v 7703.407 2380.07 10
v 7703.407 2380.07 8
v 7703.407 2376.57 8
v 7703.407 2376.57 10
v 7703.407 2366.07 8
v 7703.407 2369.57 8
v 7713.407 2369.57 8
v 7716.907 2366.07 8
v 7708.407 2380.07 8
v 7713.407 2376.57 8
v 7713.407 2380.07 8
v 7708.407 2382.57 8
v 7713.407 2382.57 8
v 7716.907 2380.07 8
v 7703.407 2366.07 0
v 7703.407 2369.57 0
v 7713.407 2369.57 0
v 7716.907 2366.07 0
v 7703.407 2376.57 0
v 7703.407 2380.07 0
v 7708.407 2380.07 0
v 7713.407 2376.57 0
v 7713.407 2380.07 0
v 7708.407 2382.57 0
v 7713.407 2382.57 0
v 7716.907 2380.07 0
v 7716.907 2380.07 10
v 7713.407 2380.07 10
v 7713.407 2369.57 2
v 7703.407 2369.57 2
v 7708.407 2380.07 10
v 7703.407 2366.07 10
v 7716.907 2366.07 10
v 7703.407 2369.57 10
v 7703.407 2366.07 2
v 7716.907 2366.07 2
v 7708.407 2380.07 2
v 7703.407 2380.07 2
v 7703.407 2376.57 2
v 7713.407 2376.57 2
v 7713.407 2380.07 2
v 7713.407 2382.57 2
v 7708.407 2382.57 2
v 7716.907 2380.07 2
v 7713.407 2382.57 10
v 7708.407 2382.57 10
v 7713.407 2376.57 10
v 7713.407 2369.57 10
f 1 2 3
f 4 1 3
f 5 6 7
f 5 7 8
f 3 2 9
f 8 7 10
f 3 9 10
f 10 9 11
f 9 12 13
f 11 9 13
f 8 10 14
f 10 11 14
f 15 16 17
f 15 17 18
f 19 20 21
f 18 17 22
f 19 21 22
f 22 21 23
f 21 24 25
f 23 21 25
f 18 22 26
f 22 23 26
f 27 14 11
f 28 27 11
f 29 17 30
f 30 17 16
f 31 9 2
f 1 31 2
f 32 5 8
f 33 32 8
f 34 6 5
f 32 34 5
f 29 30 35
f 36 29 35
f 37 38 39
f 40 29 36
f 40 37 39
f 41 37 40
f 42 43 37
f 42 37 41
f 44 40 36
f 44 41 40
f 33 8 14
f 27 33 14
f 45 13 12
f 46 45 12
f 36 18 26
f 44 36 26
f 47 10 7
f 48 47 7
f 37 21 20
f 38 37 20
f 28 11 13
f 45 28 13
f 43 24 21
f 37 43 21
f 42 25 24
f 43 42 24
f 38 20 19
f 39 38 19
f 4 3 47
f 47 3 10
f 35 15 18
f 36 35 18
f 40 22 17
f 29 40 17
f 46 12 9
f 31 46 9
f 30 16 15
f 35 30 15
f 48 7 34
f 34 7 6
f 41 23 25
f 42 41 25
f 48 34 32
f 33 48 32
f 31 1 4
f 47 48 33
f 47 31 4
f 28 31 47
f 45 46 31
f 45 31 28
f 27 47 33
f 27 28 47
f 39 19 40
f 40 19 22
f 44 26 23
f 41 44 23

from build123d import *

# Parameters (mm, degrees)
EXTRUDE_1_DEPTH        = 2
PATTERN_LINEAR_1_COUNT = 2
PATTERN_LINEAR_1_PITCH = 8


with BuildPart() as part:
    # 草图8 → 凸台-拉伸1 (new body)
    with BuildSketch(Plane.XY):
        Polygon((7713.406970683, 2376.570087092), (7713.406970683, 2369.570087092), (7703.406970683, 2369.570087092), (7703.406970683, 2367.570087092), (7703.406970683, 2366.070087092), (7716.906970683, 2366.070087092), (7716.906970683, 2367.570087092), (7716.906970683, 2378.570087092), (7716.906970683, 2380.070087092), (7713.406970683, 2380.070087092), (7713.406970683, 2382.570087092), (7708.406970683, 2382.570087092), (7708.406970683, 2380.070087092), (7703.406970683, 2380.070087092), (7703.406970683, 2378.570087092), (7703.406970683, 2376.570087092), align=None)
    extrude(amount=EXTRUDE_1_DEPTH)


with BuildPart() as pattern_linear_1_1:
    # 阵列(线性)1: pattern copy
    add(part.part.moved(Location(Vector(0, 0, 1) * (1 * PATTERN_LINEAR_1_PITCH))))


solid = Compound([part.part, pattern_linear_1_1.part])
